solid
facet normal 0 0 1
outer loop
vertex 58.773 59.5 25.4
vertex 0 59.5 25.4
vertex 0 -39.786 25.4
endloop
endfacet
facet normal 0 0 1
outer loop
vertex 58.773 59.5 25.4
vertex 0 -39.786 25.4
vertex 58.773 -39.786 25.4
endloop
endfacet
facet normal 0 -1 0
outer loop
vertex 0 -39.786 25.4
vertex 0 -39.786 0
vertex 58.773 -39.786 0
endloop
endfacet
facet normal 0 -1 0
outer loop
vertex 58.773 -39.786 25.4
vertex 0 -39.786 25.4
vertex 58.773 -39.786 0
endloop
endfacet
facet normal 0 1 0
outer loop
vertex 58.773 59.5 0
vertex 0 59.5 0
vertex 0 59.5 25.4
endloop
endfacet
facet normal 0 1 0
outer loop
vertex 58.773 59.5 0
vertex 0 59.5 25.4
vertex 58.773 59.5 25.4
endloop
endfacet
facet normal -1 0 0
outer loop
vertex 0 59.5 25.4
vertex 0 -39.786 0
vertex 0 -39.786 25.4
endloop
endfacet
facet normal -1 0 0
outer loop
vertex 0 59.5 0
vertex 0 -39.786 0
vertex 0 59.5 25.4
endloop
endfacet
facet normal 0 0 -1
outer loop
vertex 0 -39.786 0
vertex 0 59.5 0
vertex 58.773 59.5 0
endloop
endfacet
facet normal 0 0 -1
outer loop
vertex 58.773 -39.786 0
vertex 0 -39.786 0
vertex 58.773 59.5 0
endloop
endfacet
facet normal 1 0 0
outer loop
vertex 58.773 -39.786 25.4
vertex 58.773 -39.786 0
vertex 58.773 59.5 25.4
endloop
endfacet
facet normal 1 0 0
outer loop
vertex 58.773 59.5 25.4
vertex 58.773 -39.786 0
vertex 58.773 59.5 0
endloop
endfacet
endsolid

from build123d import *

# Parameters (mm, degrees)
F1_W     = 58.773093
F1_H     = 99.286083
F3_DEPTH = 25.4
F4_W     = 42.263355
F4_H     = 81.185479
F5_DEPTH = 127
F2_W     = 58.773093
F2_H     = 99.286083
F6_DEPTH = 25.4


with BuildPart() as f3:
    # F1 (on face) → F3 (new body)
    with BuildSketch(Plane.XY):
        with Locations((29.386546, 9.857067)):
            Rectangle(F1_W, F1_H)
    extrude(amount=F3_DEPTH)

    # F4 (on face) → F5 (cut)
    with BuildSketch(Plane.XY):
        with Locations((25.919133, 11.294613)):
            Rectangle(F4_W, F4_H)
    extrude(amount=-F5_DEPTH, mode=Mode.SUBTRACT)

    # F2 (on face) → F6 (cut)
    with BuildSketch(Plane.XY):
        with Locations((29.386546, 9.857067)):
            Rectangle(F2_W, F2_H)
    extrude(amount=-F6_DEPTH, mode=Mode.SUBTRACT)


solid = f3.part
